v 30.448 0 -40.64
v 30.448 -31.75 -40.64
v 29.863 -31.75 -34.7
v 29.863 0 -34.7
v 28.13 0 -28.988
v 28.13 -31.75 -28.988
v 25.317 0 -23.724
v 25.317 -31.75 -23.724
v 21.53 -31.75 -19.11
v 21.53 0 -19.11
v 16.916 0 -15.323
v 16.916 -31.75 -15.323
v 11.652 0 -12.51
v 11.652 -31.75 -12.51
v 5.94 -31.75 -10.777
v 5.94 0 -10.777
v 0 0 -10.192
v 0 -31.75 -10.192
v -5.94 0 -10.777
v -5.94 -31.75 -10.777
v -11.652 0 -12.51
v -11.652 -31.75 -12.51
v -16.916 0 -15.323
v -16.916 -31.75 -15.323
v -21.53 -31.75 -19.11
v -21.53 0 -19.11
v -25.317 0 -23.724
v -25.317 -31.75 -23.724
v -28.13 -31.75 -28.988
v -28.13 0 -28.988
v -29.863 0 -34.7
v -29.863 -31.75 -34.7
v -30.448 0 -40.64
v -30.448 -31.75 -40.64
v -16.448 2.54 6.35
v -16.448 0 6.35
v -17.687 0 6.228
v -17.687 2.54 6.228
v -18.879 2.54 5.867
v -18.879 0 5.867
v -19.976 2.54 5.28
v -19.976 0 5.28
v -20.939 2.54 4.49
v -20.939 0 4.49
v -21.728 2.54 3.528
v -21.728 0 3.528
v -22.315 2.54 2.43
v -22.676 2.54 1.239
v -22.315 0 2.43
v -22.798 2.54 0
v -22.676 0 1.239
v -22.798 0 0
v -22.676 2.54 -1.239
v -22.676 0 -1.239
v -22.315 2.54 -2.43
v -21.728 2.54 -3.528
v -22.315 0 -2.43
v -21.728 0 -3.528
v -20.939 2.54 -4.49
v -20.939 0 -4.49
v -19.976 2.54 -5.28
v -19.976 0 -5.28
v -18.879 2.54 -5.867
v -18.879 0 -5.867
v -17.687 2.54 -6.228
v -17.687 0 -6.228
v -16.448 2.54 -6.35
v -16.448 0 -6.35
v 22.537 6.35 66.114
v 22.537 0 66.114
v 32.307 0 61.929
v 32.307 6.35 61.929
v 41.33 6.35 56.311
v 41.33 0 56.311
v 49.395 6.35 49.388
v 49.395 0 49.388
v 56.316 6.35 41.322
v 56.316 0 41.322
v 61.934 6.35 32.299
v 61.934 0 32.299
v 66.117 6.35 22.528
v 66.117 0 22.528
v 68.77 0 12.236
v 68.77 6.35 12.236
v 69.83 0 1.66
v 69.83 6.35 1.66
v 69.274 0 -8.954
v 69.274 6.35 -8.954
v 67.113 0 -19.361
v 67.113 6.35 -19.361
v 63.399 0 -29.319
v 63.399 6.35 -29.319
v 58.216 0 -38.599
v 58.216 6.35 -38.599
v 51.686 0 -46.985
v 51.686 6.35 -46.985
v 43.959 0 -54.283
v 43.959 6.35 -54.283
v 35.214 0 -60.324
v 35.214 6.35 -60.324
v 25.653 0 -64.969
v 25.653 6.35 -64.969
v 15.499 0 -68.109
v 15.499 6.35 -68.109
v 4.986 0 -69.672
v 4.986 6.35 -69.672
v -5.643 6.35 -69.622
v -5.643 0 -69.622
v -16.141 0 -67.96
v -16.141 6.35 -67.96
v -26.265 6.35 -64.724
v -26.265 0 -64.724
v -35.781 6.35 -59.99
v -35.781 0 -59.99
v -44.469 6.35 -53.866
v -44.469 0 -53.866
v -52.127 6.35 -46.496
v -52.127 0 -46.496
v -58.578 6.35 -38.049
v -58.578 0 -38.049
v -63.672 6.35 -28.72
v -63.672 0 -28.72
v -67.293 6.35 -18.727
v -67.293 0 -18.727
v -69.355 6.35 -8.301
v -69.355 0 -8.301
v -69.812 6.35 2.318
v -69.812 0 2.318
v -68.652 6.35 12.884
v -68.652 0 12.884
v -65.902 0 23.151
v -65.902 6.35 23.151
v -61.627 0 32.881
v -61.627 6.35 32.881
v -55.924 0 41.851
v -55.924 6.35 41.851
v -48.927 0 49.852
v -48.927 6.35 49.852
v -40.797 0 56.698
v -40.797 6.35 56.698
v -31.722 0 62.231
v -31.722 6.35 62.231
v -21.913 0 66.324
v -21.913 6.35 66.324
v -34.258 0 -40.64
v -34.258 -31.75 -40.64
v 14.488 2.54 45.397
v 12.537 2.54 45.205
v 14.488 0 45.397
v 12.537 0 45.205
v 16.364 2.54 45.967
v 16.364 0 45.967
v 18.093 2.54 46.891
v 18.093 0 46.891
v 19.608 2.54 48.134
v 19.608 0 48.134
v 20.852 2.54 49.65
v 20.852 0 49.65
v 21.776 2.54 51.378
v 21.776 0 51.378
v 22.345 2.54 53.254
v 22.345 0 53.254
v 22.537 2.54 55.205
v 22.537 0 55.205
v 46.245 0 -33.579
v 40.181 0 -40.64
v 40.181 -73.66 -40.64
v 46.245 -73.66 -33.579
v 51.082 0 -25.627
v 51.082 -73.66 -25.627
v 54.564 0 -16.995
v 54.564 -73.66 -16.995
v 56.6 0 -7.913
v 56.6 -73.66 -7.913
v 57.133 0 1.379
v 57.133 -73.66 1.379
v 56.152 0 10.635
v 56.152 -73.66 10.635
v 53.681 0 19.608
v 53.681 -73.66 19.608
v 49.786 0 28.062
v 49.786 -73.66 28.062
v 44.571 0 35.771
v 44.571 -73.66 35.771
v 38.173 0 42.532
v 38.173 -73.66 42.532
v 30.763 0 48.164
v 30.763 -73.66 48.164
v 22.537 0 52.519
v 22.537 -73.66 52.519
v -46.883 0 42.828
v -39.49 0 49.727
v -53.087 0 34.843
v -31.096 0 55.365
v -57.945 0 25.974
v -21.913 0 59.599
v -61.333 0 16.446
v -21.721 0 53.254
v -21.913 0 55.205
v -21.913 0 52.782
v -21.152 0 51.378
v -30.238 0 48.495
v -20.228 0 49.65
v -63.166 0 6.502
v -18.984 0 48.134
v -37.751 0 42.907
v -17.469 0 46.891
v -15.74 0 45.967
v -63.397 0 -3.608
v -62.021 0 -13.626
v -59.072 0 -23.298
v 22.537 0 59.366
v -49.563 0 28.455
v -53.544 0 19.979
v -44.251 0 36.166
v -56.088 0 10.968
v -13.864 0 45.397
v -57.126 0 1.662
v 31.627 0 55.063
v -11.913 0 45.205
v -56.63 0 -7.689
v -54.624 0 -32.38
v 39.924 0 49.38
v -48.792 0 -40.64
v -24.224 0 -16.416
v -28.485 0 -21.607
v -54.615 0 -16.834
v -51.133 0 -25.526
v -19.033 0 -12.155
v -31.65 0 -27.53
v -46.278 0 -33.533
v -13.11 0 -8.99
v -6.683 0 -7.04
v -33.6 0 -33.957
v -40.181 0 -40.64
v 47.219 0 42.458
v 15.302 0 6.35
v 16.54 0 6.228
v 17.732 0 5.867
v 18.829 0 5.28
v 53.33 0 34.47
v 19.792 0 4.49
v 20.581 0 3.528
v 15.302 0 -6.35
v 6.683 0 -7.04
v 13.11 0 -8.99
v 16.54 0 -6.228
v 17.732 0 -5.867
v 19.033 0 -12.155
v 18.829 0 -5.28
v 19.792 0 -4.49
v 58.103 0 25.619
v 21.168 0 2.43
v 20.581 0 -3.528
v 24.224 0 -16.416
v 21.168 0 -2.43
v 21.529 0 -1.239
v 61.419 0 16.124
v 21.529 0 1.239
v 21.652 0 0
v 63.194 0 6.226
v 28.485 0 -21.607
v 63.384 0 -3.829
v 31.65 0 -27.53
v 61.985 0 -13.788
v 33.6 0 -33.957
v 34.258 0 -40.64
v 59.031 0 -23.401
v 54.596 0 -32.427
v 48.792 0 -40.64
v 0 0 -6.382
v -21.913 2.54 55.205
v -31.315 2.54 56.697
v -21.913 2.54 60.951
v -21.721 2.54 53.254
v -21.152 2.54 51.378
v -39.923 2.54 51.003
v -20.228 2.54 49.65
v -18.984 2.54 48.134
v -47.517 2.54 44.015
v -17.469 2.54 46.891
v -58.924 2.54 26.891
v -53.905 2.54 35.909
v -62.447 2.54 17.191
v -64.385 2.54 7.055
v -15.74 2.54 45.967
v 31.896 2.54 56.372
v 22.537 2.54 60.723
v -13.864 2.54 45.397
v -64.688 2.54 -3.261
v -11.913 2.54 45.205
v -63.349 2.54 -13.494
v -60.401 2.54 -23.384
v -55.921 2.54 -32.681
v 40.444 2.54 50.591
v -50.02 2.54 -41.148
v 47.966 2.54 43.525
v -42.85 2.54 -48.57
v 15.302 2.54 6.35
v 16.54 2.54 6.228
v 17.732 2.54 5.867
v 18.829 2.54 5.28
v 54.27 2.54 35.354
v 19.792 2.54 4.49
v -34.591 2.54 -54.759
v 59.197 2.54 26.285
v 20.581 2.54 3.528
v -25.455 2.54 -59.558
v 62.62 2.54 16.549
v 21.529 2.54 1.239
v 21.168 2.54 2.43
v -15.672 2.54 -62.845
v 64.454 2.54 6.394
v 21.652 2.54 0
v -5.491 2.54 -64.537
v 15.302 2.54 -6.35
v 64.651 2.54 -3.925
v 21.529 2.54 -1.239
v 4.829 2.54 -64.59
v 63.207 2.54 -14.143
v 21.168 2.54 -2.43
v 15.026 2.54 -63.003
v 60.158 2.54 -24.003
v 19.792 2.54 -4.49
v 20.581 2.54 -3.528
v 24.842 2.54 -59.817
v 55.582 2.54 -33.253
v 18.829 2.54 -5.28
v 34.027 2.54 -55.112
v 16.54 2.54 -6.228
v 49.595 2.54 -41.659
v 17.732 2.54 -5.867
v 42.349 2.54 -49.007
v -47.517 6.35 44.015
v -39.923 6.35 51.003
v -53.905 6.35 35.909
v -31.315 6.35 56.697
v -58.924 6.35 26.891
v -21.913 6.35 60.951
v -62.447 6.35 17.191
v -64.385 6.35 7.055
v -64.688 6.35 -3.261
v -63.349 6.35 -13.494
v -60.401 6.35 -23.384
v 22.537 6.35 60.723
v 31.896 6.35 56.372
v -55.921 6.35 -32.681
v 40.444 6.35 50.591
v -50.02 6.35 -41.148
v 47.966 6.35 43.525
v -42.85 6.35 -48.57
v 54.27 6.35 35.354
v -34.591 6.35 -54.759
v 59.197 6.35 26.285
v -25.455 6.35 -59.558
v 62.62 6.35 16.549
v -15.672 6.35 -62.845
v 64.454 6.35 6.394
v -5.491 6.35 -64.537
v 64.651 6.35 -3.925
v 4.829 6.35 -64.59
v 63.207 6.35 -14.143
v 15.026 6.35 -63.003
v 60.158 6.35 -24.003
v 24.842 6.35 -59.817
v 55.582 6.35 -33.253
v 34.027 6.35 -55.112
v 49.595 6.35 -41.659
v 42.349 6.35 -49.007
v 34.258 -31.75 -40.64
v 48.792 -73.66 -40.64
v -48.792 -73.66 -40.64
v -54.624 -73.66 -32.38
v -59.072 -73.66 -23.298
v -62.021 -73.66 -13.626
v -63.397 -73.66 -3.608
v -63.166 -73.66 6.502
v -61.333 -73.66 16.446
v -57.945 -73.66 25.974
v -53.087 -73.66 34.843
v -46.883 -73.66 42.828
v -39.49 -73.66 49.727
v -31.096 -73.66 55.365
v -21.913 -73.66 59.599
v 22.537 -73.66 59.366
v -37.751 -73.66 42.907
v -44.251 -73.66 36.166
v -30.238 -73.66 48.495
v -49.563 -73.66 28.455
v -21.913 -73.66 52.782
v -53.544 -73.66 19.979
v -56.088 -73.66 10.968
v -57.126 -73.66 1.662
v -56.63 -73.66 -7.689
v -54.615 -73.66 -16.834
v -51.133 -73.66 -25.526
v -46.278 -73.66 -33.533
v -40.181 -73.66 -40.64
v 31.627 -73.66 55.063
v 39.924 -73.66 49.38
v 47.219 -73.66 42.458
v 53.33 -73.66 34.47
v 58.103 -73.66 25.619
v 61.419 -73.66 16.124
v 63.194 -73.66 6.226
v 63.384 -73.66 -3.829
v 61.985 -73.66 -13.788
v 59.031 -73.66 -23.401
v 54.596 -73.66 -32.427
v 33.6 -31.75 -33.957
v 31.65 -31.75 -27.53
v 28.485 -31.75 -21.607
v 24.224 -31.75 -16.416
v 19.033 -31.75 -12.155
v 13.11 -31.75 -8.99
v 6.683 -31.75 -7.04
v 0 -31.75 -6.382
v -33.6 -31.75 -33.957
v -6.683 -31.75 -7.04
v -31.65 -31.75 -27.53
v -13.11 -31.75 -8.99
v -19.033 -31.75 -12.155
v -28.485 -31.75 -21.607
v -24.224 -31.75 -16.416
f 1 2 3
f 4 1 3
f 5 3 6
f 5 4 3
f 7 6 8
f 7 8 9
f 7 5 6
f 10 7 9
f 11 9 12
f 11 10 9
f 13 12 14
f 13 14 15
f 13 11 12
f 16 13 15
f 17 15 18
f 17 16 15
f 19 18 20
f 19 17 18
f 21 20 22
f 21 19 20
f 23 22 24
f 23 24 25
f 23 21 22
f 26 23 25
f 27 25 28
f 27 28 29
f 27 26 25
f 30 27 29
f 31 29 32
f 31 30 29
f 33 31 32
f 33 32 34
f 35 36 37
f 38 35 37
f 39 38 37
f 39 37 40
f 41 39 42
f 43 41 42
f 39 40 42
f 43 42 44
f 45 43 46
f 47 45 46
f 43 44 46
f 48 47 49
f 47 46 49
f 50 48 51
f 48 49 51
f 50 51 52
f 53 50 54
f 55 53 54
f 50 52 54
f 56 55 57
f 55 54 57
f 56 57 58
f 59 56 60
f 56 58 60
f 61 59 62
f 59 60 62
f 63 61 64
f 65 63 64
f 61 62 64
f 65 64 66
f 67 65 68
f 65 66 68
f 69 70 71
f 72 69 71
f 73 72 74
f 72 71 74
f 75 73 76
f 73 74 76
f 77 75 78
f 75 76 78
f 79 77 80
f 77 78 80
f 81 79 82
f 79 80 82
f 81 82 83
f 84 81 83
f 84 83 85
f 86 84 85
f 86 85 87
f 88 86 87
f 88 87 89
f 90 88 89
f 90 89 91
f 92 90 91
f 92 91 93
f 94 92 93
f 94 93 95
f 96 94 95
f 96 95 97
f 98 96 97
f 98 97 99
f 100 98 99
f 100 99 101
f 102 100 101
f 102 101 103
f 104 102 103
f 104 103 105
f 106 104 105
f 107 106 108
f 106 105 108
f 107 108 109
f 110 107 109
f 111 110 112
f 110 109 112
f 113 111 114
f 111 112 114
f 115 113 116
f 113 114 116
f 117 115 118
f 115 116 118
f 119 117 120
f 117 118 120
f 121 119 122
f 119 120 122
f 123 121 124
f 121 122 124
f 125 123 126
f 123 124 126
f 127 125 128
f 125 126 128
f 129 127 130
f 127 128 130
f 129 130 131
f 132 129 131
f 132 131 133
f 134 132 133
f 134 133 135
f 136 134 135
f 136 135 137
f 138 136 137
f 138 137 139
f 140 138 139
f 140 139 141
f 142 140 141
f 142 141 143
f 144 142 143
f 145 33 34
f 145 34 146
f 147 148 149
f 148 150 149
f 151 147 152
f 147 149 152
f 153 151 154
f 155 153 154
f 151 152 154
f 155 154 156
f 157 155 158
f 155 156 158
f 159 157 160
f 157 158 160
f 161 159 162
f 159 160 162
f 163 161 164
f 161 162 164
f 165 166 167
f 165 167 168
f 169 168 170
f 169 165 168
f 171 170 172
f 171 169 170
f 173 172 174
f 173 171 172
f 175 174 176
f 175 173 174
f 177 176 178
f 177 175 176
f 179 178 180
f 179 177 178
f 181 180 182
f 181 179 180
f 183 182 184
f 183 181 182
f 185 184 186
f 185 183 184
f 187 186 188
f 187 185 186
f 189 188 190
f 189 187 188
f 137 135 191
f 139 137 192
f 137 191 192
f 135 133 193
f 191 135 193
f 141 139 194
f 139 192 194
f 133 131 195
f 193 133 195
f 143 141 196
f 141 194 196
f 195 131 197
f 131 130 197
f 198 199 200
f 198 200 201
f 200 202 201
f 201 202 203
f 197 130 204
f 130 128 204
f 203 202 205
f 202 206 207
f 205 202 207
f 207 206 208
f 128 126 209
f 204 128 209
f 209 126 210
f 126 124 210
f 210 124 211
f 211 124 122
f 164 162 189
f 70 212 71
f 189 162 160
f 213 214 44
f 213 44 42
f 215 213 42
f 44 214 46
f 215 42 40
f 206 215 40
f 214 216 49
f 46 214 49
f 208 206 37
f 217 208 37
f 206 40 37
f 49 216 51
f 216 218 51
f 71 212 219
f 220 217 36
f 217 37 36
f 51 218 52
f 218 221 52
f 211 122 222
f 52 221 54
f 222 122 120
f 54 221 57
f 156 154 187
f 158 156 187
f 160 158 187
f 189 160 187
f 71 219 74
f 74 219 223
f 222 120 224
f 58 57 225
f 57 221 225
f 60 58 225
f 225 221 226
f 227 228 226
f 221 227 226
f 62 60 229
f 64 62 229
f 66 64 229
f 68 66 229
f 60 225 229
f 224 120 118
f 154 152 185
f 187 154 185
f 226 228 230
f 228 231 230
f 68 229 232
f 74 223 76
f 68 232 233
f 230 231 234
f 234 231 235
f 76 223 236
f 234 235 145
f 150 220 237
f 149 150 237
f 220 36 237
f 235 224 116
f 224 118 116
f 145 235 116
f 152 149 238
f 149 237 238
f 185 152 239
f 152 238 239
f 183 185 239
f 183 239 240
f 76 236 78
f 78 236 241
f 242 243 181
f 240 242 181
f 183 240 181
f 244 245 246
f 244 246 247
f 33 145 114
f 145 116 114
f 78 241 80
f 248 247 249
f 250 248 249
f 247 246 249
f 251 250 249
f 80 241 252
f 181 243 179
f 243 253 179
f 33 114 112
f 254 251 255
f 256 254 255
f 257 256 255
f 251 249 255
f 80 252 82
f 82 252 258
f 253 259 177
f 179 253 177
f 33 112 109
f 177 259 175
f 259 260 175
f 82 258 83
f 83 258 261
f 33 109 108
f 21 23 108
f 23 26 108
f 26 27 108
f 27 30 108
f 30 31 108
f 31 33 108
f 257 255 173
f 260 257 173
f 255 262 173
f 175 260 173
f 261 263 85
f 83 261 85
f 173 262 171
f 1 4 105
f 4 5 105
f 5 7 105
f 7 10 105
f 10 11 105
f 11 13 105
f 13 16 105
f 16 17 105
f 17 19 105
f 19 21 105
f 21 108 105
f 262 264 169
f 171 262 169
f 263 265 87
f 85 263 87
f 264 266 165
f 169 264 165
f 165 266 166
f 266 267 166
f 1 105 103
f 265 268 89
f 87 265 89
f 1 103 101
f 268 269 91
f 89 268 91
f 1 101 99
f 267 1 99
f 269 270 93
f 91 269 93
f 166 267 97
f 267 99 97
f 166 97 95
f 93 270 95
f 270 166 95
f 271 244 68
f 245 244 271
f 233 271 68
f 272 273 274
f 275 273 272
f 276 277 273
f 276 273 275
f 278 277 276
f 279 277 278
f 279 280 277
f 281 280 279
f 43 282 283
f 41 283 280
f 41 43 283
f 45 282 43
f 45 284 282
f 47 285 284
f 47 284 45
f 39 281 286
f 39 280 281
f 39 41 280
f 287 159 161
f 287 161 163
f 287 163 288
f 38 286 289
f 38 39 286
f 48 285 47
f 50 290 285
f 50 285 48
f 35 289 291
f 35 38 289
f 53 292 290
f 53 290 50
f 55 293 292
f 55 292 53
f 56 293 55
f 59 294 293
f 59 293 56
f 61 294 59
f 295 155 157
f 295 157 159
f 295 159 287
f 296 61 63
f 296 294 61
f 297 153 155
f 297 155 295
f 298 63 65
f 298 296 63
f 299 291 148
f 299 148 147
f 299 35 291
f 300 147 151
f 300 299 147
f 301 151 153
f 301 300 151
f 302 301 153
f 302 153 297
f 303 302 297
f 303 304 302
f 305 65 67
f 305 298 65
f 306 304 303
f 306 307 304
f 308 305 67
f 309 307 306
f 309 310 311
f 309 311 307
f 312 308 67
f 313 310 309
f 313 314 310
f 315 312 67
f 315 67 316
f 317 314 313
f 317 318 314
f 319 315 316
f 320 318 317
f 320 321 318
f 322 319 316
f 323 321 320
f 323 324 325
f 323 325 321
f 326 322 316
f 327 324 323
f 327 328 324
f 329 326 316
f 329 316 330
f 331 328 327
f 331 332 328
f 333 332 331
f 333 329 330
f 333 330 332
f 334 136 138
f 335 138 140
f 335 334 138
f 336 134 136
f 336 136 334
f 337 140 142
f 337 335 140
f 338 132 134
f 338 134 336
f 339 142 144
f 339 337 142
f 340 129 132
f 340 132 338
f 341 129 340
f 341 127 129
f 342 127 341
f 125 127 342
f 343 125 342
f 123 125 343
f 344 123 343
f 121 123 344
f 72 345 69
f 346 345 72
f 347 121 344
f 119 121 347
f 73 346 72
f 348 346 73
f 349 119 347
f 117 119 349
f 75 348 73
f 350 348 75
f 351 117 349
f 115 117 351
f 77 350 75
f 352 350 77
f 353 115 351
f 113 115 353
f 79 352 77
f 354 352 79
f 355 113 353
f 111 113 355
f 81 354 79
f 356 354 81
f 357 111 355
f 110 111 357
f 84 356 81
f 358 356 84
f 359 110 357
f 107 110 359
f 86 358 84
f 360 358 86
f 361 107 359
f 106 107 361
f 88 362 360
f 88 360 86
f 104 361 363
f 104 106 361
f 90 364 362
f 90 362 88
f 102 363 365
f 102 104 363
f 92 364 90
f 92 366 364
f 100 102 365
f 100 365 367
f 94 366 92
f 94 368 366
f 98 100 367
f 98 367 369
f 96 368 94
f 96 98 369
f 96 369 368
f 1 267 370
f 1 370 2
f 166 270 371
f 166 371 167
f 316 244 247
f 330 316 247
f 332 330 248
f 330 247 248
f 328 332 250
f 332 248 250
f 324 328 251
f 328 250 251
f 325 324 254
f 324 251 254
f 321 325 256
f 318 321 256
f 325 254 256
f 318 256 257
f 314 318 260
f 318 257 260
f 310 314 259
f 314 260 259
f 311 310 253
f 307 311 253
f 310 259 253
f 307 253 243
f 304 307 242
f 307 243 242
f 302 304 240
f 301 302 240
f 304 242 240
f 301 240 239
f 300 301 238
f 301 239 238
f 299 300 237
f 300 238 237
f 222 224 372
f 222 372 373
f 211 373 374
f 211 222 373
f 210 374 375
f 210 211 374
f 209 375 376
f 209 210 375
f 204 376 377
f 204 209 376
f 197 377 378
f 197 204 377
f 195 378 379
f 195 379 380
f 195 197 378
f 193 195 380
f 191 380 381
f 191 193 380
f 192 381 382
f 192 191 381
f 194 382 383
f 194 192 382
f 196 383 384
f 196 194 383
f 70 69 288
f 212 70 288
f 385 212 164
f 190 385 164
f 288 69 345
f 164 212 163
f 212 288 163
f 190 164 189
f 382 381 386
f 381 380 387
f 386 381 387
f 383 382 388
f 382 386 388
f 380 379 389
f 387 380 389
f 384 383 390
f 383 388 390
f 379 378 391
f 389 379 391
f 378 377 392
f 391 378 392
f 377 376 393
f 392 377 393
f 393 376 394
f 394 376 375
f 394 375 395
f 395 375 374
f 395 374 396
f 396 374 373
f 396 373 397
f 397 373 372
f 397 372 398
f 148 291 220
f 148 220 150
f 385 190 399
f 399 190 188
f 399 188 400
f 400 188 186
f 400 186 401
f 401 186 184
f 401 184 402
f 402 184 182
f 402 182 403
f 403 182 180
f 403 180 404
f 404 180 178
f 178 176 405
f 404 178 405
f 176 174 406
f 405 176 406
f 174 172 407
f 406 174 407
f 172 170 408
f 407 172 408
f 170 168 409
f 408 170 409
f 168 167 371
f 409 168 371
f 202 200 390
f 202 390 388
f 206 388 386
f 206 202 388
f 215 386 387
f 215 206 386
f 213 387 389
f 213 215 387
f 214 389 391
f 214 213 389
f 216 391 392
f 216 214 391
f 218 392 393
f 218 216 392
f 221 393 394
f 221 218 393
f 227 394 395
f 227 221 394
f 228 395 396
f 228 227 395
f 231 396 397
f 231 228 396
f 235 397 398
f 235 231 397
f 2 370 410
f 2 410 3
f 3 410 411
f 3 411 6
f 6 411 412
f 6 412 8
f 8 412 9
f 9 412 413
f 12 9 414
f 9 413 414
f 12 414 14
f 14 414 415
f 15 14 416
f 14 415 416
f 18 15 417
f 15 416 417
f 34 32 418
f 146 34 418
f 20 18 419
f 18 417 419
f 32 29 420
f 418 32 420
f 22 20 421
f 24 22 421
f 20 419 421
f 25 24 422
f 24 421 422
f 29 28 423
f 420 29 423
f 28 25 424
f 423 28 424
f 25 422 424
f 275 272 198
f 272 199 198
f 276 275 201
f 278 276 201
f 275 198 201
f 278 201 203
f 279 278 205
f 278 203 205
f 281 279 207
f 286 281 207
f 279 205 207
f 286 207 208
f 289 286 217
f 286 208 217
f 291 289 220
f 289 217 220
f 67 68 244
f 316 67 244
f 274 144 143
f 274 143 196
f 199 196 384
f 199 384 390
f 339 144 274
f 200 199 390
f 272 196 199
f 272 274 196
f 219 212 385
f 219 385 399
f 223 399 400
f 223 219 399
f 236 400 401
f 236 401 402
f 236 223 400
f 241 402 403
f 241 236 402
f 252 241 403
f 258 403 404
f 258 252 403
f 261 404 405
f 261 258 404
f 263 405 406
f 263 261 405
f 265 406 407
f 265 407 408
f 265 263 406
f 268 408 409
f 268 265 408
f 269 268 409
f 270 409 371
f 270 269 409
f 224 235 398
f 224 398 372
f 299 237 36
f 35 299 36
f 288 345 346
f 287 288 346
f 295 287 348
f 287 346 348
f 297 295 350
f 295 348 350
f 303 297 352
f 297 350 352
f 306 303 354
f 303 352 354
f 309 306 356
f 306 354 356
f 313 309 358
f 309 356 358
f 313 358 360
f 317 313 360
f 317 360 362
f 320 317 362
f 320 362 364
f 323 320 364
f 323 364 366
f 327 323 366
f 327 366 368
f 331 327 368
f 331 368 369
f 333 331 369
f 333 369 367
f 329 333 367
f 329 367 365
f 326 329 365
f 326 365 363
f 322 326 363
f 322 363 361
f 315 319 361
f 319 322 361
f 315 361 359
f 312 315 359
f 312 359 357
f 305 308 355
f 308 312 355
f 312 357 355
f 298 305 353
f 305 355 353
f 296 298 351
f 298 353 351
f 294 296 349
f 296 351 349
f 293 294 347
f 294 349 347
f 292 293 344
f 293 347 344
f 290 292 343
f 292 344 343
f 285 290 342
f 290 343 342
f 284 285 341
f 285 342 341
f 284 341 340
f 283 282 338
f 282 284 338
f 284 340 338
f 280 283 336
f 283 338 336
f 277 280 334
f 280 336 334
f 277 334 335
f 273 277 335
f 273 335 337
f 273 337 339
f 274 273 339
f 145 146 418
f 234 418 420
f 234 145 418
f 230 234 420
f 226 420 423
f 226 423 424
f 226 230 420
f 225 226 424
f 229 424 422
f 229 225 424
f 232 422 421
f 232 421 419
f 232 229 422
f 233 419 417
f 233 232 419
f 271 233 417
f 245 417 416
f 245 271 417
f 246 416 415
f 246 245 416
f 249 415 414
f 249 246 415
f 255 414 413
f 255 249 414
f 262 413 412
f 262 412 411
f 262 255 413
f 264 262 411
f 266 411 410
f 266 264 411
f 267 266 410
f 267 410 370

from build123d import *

# Parameters (mm, degrees)
SKETCH3_R           = 69.85
BOSS_EXTRUDE1_DEPTH = 6.35
SKETCH4_R           = 64.77
CUT_EXTRUDE1_DEPTH  = 3.81
SKETCH5_W           = 44.45
SKETCH5_H           = 25.4
CUT_EXTRUDE2_DEPTH  = 7.35
FILLET1_R           = 10
BOSS_EXTRUDE2_DEPTH = 31.75
BOSS_EXTRUDE3_DEPTH = 76.2


with BuildPart() as part:
    # Sketch3 → Boss-Extrude1 (new body)
    with BuildSketch(Plane(origin=(0, 0, 0), x_dir=(1, 0, 0), z_dir=(0, 1, 0))):
        Circle(SKETCH3_R)
        with BuildLine():
            Line((-16.448489627, 6.35), (15.301510373, 6.35))
            ThreePointArc((15.301510373, 6.35), (21.651510373, 0), (15.301510373, -6.35))
            Line((15.301510373, -6.35), (-16.448489627, -6.35))
            ThreePointArc((-16.448489627, -6.35), (-22.798489627, 0), (-16.448489627, 6.35))
        make_face(mode=Mode.SUBTRACT)
    extrude(amount=BOSS_EXTRUDE1_DEPTH)

    # Sketch4 → Cut-Extrude1 (cut)
    with BuildSketch(Plane(origin=(0, 6.35, 0), x_dir=(1, 0, 0), z_dir=(0, 1, 0))):
        Circle(SKETCH4_R)
    extrude(amount=-CUT_EXTRUDE1_DEPTH, mode=Mode.SUBTRACT)

    # Sketch5 → Cut-Extrude2 (cut, through all)
    with BuildSketch(Plane(origin=(0, 6.35, 0), x_dir=(1, 0, 0), z_dir=(0, 1, 0))):
        with Locations((0.312165283, -57.905331129)):
            Rectangle(SKETCH5_W, SKETCH5_H)
    extrude(amount=-CUT_EXTRUDE2_DEPTH, mode=Mode.SUBTRACT)

    # Fillet1
    fillet1_edges = [part.edges().sort_by_distance(p)[0] for p in [
        (22.537165283, 1.27, 45.205331129),
        (-21.912834717, 1.27, 45.205331129),
    ]]
    fillet(fillet1_edges, radius=FILLET1_R)

    # Sketch8 → Boss-Extrude2 (add)
    with BuildSketch(Plane.XZ):
        with BuildLine():
            Line((34.258206884, -40.64), (30.448206884, -40.64))
            ThreePointArc((30.448206884, -40.64), (0, -10.191793116), (-30.448206884, -40.64))
            Line((-30.448206884, -40.64), (-34.258206884, -40.64))
            ThreePointArc((-34.258206884, -40.64), (0, -6.381793116), (34.258206884, -40.64))
        make_face()
    extrude(amount=BOSS_EXTRUDE2_DEPTH)

    # Sketch11 → Boss-Extrude3 (add)
    with BuildSketch(Plane(origin=(0, 2.54, 0), x_dir=(1, 0, 0), z_dir=(0, 1, 0))):
        with BuildLine():
            ThreePointArc((-21.912834717, -52.782100893), (-56.087729184, -10.967640358), (-40.18100173, 40.64))
            Line((-40.18100173, 40.64), (-48.791806689, 40.64))
            ThreePointArc((-48.791806689, 40.64), (-61.333240284, -16.446386725), (-21.912834717, -59.599309347))
            Line((-21.912834717, -59.599309347), (-21.912834717, -55.205331129))
            Line((-21.912834717, -55.205331129), (-21.912834717, -52.782100893))
        make_face()
        with BuildLine():
            Line((48.791806689, 40.64), (40.18100173, 40.64))
            ThreePointArc((40.18100173, 40.64), (56.15176968, -10.634907703), (22.537165283, -52.518555588))
            Line((22.537165283, -52.518555588), (22.537165283, -55.205331129))
            Line((22.537165283, -55.205331129), (22.537165283, -59.366035584))
            ThreePointArc((22.537165283, -59.366035584), (61.418705204, -16.124287613), (48.791806689, 40.64))
        make_face()
    extrude(amount=-BOSS_EXTRUDE3_DEPTH)


solid = part.part
